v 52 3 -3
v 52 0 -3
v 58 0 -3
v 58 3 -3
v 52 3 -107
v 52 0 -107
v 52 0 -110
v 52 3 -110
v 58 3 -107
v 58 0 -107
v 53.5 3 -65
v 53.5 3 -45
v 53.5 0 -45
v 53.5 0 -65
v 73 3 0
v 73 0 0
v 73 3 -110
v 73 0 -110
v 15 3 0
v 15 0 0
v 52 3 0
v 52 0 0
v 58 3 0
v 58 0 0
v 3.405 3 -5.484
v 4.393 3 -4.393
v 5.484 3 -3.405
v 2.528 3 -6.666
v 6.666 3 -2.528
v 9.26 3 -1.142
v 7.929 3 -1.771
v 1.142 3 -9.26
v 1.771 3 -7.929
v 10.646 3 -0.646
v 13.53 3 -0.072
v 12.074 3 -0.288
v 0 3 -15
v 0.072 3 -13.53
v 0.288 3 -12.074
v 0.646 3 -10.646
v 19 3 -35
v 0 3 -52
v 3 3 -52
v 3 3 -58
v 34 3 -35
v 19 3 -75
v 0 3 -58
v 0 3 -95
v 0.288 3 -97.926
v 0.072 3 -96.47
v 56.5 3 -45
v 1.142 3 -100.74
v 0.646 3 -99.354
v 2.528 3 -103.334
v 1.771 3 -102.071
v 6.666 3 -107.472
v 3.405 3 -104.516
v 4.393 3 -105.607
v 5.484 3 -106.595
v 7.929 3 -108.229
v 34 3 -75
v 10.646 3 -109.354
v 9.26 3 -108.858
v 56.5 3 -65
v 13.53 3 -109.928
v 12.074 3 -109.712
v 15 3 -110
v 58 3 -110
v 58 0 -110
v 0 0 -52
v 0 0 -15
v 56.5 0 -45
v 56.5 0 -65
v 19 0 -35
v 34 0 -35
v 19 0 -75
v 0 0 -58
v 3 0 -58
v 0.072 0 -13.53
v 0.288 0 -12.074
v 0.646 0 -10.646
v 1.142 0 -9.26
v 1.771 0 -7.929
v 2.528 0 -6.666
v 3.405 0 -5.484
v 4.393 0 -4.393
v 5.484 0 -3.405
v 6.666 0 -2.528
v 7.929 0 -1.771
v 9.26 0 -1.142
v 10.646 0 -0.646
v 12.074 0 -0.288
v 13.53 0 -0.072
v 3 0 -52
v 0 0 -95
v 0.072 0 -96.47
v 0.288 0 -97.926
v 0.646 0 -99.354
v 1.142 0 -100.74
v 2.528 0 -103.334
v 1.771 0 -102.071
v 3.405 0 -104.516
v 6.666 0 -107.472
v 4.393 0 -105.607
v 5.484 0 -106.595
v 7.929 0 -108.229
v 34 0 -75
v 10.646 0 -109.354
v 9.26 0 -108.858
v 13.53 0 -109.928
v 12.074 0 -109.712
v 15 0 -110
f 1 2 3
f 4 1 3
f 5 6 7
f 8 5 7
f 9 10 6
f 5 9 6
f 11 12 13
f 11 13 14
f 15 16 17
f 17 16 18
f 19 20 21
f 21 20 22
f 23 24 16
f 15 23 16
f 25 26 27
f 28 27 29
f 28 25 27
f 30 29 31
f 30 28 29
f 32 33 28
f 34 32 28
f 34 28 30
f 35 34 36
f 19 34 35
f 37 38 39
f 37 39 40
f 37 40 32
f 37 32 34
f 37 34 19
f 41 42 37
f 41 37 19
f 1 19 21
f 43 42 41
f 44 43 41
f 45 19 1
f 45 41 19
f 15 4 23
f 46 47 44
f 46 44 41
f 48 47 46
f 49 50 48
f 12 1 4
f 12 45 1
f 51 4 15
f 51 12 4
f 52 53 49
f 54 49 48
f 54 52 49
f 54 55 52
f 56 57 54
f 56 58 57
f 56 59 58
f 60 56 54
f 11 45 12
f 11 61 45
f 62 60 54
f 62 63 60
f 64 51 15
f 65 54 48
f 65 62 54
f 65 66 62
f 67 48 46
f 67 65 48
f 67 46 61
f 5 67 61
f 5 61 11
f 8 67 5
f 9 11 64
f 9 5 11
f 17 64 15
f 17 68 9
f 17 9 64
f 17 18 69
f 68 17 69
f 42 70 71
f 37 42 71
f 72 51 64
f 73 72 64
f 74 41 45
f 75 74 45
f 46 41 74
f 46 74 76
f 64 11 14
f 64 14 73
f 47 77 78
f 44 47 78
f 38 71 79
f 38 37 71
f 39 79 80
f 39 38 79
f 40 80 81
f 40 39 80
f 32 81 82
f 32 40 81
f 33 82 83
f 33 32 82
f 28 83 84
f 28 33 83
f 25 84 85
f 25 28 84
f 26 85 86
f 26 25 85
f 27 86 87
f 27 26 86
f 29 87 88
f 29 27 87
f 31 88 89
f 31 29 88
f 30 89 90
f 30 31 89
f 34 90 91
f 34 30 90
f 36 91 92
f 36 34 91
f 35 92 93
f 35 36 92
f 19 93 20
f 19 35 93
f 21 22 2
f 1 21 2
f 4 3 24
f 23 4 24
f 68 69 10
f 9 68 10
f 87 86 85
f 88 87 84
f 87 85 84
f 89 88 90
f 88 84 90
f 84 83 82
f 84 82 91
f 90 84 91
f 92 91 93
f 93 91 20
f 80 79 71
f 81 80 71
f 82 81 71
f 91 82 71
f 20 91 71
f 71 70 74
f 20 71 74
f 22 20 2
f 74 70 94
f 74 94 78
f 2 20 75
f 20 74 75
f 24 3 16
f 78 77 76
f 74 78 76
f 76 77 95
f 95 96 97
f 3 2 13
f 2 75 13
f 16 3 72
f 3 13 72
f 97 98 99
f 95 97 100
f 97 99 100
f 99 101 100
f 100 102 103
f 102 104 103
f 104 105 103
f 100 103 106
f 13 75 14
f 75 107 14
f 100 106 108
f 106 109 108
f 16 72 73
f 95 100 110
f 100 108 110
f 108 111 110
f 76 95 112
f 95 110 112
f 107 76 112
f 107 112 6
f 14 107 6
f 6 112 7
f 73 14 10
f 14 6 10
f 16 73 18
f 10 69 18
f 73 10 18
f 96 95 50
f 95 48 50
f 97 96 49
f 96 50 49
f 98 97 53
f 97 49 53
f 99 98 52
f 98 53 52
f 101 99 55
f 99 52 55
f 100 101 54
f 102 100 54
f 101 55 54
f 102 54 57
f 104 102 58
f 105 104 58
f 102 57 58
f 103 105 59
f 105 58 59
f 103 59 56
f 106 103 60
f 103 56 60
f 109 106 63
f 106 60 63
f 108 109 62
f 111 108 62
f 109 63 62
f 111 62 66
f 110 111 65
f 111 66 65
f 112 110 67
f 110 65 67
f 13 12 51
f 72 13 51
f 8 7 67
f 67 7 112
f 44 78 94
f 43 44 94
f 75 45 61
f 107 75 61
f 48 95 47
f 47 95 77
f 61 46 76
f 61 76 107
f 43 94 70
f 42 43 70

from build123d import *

# Parameters (mm, degrees)
EXTRUDE_3_DEPTH    = 3
SKETCH1_W          = 15
SKETCH1_H          = 40
SKETCH1_W_2        = 3
SKETCH1_H_2        = 20
CUT_EXTRUDE1_DEPTH = 10
FILLET1_R          = 15


with BuildPart() as part:
    # Эскиз4 → Бобышка-Вытянуть3 (new body)
    with BuildSketch(Plane(origin=(0, 0, 0), x_dir=(1, 0, 0), z_dir=(0, 1, 0))):
        Polygon((0, 110), (0, 58), (3, 58), (3, 52), (0, 52), (0, 0), (52, 0), (52, 3), (58, 3), (58, 0), (73, 0), (73, 110), (58, 110), (58, 107), (52, 107), (52, 110), align=None)
    extrude(amount=EXTRUDE_3_DEPTH)

    # Sketch1 → Cut-Extrude1 (cut)
    with BuildSketch(Plane(origin=(0, 3, 0), x_dir=(1, 0, 0), z_dir=(0, 1, 0))):
        with Locations((26.5, 55)):
            Rectangle(SKETCH1_W, SKETCH1_H)
        with Locations((55, 55)):
            Rectangle(SKETCH1_W_2, SKETCH1_H_2)
    extrude(amount=-CUT_EXTRUDE1_DEPTH, mode=Mode.SUBTRACT)

    # Fillet1
    fillet1_edges = [part.edges().sort_by_distance(p)[0] for p in [
        (0, 1.5, 0),
        (0, 1.5, -110),
    ]]
    fillet(fillet1_edges, radius=FILLET1_R)


solid = part.part
